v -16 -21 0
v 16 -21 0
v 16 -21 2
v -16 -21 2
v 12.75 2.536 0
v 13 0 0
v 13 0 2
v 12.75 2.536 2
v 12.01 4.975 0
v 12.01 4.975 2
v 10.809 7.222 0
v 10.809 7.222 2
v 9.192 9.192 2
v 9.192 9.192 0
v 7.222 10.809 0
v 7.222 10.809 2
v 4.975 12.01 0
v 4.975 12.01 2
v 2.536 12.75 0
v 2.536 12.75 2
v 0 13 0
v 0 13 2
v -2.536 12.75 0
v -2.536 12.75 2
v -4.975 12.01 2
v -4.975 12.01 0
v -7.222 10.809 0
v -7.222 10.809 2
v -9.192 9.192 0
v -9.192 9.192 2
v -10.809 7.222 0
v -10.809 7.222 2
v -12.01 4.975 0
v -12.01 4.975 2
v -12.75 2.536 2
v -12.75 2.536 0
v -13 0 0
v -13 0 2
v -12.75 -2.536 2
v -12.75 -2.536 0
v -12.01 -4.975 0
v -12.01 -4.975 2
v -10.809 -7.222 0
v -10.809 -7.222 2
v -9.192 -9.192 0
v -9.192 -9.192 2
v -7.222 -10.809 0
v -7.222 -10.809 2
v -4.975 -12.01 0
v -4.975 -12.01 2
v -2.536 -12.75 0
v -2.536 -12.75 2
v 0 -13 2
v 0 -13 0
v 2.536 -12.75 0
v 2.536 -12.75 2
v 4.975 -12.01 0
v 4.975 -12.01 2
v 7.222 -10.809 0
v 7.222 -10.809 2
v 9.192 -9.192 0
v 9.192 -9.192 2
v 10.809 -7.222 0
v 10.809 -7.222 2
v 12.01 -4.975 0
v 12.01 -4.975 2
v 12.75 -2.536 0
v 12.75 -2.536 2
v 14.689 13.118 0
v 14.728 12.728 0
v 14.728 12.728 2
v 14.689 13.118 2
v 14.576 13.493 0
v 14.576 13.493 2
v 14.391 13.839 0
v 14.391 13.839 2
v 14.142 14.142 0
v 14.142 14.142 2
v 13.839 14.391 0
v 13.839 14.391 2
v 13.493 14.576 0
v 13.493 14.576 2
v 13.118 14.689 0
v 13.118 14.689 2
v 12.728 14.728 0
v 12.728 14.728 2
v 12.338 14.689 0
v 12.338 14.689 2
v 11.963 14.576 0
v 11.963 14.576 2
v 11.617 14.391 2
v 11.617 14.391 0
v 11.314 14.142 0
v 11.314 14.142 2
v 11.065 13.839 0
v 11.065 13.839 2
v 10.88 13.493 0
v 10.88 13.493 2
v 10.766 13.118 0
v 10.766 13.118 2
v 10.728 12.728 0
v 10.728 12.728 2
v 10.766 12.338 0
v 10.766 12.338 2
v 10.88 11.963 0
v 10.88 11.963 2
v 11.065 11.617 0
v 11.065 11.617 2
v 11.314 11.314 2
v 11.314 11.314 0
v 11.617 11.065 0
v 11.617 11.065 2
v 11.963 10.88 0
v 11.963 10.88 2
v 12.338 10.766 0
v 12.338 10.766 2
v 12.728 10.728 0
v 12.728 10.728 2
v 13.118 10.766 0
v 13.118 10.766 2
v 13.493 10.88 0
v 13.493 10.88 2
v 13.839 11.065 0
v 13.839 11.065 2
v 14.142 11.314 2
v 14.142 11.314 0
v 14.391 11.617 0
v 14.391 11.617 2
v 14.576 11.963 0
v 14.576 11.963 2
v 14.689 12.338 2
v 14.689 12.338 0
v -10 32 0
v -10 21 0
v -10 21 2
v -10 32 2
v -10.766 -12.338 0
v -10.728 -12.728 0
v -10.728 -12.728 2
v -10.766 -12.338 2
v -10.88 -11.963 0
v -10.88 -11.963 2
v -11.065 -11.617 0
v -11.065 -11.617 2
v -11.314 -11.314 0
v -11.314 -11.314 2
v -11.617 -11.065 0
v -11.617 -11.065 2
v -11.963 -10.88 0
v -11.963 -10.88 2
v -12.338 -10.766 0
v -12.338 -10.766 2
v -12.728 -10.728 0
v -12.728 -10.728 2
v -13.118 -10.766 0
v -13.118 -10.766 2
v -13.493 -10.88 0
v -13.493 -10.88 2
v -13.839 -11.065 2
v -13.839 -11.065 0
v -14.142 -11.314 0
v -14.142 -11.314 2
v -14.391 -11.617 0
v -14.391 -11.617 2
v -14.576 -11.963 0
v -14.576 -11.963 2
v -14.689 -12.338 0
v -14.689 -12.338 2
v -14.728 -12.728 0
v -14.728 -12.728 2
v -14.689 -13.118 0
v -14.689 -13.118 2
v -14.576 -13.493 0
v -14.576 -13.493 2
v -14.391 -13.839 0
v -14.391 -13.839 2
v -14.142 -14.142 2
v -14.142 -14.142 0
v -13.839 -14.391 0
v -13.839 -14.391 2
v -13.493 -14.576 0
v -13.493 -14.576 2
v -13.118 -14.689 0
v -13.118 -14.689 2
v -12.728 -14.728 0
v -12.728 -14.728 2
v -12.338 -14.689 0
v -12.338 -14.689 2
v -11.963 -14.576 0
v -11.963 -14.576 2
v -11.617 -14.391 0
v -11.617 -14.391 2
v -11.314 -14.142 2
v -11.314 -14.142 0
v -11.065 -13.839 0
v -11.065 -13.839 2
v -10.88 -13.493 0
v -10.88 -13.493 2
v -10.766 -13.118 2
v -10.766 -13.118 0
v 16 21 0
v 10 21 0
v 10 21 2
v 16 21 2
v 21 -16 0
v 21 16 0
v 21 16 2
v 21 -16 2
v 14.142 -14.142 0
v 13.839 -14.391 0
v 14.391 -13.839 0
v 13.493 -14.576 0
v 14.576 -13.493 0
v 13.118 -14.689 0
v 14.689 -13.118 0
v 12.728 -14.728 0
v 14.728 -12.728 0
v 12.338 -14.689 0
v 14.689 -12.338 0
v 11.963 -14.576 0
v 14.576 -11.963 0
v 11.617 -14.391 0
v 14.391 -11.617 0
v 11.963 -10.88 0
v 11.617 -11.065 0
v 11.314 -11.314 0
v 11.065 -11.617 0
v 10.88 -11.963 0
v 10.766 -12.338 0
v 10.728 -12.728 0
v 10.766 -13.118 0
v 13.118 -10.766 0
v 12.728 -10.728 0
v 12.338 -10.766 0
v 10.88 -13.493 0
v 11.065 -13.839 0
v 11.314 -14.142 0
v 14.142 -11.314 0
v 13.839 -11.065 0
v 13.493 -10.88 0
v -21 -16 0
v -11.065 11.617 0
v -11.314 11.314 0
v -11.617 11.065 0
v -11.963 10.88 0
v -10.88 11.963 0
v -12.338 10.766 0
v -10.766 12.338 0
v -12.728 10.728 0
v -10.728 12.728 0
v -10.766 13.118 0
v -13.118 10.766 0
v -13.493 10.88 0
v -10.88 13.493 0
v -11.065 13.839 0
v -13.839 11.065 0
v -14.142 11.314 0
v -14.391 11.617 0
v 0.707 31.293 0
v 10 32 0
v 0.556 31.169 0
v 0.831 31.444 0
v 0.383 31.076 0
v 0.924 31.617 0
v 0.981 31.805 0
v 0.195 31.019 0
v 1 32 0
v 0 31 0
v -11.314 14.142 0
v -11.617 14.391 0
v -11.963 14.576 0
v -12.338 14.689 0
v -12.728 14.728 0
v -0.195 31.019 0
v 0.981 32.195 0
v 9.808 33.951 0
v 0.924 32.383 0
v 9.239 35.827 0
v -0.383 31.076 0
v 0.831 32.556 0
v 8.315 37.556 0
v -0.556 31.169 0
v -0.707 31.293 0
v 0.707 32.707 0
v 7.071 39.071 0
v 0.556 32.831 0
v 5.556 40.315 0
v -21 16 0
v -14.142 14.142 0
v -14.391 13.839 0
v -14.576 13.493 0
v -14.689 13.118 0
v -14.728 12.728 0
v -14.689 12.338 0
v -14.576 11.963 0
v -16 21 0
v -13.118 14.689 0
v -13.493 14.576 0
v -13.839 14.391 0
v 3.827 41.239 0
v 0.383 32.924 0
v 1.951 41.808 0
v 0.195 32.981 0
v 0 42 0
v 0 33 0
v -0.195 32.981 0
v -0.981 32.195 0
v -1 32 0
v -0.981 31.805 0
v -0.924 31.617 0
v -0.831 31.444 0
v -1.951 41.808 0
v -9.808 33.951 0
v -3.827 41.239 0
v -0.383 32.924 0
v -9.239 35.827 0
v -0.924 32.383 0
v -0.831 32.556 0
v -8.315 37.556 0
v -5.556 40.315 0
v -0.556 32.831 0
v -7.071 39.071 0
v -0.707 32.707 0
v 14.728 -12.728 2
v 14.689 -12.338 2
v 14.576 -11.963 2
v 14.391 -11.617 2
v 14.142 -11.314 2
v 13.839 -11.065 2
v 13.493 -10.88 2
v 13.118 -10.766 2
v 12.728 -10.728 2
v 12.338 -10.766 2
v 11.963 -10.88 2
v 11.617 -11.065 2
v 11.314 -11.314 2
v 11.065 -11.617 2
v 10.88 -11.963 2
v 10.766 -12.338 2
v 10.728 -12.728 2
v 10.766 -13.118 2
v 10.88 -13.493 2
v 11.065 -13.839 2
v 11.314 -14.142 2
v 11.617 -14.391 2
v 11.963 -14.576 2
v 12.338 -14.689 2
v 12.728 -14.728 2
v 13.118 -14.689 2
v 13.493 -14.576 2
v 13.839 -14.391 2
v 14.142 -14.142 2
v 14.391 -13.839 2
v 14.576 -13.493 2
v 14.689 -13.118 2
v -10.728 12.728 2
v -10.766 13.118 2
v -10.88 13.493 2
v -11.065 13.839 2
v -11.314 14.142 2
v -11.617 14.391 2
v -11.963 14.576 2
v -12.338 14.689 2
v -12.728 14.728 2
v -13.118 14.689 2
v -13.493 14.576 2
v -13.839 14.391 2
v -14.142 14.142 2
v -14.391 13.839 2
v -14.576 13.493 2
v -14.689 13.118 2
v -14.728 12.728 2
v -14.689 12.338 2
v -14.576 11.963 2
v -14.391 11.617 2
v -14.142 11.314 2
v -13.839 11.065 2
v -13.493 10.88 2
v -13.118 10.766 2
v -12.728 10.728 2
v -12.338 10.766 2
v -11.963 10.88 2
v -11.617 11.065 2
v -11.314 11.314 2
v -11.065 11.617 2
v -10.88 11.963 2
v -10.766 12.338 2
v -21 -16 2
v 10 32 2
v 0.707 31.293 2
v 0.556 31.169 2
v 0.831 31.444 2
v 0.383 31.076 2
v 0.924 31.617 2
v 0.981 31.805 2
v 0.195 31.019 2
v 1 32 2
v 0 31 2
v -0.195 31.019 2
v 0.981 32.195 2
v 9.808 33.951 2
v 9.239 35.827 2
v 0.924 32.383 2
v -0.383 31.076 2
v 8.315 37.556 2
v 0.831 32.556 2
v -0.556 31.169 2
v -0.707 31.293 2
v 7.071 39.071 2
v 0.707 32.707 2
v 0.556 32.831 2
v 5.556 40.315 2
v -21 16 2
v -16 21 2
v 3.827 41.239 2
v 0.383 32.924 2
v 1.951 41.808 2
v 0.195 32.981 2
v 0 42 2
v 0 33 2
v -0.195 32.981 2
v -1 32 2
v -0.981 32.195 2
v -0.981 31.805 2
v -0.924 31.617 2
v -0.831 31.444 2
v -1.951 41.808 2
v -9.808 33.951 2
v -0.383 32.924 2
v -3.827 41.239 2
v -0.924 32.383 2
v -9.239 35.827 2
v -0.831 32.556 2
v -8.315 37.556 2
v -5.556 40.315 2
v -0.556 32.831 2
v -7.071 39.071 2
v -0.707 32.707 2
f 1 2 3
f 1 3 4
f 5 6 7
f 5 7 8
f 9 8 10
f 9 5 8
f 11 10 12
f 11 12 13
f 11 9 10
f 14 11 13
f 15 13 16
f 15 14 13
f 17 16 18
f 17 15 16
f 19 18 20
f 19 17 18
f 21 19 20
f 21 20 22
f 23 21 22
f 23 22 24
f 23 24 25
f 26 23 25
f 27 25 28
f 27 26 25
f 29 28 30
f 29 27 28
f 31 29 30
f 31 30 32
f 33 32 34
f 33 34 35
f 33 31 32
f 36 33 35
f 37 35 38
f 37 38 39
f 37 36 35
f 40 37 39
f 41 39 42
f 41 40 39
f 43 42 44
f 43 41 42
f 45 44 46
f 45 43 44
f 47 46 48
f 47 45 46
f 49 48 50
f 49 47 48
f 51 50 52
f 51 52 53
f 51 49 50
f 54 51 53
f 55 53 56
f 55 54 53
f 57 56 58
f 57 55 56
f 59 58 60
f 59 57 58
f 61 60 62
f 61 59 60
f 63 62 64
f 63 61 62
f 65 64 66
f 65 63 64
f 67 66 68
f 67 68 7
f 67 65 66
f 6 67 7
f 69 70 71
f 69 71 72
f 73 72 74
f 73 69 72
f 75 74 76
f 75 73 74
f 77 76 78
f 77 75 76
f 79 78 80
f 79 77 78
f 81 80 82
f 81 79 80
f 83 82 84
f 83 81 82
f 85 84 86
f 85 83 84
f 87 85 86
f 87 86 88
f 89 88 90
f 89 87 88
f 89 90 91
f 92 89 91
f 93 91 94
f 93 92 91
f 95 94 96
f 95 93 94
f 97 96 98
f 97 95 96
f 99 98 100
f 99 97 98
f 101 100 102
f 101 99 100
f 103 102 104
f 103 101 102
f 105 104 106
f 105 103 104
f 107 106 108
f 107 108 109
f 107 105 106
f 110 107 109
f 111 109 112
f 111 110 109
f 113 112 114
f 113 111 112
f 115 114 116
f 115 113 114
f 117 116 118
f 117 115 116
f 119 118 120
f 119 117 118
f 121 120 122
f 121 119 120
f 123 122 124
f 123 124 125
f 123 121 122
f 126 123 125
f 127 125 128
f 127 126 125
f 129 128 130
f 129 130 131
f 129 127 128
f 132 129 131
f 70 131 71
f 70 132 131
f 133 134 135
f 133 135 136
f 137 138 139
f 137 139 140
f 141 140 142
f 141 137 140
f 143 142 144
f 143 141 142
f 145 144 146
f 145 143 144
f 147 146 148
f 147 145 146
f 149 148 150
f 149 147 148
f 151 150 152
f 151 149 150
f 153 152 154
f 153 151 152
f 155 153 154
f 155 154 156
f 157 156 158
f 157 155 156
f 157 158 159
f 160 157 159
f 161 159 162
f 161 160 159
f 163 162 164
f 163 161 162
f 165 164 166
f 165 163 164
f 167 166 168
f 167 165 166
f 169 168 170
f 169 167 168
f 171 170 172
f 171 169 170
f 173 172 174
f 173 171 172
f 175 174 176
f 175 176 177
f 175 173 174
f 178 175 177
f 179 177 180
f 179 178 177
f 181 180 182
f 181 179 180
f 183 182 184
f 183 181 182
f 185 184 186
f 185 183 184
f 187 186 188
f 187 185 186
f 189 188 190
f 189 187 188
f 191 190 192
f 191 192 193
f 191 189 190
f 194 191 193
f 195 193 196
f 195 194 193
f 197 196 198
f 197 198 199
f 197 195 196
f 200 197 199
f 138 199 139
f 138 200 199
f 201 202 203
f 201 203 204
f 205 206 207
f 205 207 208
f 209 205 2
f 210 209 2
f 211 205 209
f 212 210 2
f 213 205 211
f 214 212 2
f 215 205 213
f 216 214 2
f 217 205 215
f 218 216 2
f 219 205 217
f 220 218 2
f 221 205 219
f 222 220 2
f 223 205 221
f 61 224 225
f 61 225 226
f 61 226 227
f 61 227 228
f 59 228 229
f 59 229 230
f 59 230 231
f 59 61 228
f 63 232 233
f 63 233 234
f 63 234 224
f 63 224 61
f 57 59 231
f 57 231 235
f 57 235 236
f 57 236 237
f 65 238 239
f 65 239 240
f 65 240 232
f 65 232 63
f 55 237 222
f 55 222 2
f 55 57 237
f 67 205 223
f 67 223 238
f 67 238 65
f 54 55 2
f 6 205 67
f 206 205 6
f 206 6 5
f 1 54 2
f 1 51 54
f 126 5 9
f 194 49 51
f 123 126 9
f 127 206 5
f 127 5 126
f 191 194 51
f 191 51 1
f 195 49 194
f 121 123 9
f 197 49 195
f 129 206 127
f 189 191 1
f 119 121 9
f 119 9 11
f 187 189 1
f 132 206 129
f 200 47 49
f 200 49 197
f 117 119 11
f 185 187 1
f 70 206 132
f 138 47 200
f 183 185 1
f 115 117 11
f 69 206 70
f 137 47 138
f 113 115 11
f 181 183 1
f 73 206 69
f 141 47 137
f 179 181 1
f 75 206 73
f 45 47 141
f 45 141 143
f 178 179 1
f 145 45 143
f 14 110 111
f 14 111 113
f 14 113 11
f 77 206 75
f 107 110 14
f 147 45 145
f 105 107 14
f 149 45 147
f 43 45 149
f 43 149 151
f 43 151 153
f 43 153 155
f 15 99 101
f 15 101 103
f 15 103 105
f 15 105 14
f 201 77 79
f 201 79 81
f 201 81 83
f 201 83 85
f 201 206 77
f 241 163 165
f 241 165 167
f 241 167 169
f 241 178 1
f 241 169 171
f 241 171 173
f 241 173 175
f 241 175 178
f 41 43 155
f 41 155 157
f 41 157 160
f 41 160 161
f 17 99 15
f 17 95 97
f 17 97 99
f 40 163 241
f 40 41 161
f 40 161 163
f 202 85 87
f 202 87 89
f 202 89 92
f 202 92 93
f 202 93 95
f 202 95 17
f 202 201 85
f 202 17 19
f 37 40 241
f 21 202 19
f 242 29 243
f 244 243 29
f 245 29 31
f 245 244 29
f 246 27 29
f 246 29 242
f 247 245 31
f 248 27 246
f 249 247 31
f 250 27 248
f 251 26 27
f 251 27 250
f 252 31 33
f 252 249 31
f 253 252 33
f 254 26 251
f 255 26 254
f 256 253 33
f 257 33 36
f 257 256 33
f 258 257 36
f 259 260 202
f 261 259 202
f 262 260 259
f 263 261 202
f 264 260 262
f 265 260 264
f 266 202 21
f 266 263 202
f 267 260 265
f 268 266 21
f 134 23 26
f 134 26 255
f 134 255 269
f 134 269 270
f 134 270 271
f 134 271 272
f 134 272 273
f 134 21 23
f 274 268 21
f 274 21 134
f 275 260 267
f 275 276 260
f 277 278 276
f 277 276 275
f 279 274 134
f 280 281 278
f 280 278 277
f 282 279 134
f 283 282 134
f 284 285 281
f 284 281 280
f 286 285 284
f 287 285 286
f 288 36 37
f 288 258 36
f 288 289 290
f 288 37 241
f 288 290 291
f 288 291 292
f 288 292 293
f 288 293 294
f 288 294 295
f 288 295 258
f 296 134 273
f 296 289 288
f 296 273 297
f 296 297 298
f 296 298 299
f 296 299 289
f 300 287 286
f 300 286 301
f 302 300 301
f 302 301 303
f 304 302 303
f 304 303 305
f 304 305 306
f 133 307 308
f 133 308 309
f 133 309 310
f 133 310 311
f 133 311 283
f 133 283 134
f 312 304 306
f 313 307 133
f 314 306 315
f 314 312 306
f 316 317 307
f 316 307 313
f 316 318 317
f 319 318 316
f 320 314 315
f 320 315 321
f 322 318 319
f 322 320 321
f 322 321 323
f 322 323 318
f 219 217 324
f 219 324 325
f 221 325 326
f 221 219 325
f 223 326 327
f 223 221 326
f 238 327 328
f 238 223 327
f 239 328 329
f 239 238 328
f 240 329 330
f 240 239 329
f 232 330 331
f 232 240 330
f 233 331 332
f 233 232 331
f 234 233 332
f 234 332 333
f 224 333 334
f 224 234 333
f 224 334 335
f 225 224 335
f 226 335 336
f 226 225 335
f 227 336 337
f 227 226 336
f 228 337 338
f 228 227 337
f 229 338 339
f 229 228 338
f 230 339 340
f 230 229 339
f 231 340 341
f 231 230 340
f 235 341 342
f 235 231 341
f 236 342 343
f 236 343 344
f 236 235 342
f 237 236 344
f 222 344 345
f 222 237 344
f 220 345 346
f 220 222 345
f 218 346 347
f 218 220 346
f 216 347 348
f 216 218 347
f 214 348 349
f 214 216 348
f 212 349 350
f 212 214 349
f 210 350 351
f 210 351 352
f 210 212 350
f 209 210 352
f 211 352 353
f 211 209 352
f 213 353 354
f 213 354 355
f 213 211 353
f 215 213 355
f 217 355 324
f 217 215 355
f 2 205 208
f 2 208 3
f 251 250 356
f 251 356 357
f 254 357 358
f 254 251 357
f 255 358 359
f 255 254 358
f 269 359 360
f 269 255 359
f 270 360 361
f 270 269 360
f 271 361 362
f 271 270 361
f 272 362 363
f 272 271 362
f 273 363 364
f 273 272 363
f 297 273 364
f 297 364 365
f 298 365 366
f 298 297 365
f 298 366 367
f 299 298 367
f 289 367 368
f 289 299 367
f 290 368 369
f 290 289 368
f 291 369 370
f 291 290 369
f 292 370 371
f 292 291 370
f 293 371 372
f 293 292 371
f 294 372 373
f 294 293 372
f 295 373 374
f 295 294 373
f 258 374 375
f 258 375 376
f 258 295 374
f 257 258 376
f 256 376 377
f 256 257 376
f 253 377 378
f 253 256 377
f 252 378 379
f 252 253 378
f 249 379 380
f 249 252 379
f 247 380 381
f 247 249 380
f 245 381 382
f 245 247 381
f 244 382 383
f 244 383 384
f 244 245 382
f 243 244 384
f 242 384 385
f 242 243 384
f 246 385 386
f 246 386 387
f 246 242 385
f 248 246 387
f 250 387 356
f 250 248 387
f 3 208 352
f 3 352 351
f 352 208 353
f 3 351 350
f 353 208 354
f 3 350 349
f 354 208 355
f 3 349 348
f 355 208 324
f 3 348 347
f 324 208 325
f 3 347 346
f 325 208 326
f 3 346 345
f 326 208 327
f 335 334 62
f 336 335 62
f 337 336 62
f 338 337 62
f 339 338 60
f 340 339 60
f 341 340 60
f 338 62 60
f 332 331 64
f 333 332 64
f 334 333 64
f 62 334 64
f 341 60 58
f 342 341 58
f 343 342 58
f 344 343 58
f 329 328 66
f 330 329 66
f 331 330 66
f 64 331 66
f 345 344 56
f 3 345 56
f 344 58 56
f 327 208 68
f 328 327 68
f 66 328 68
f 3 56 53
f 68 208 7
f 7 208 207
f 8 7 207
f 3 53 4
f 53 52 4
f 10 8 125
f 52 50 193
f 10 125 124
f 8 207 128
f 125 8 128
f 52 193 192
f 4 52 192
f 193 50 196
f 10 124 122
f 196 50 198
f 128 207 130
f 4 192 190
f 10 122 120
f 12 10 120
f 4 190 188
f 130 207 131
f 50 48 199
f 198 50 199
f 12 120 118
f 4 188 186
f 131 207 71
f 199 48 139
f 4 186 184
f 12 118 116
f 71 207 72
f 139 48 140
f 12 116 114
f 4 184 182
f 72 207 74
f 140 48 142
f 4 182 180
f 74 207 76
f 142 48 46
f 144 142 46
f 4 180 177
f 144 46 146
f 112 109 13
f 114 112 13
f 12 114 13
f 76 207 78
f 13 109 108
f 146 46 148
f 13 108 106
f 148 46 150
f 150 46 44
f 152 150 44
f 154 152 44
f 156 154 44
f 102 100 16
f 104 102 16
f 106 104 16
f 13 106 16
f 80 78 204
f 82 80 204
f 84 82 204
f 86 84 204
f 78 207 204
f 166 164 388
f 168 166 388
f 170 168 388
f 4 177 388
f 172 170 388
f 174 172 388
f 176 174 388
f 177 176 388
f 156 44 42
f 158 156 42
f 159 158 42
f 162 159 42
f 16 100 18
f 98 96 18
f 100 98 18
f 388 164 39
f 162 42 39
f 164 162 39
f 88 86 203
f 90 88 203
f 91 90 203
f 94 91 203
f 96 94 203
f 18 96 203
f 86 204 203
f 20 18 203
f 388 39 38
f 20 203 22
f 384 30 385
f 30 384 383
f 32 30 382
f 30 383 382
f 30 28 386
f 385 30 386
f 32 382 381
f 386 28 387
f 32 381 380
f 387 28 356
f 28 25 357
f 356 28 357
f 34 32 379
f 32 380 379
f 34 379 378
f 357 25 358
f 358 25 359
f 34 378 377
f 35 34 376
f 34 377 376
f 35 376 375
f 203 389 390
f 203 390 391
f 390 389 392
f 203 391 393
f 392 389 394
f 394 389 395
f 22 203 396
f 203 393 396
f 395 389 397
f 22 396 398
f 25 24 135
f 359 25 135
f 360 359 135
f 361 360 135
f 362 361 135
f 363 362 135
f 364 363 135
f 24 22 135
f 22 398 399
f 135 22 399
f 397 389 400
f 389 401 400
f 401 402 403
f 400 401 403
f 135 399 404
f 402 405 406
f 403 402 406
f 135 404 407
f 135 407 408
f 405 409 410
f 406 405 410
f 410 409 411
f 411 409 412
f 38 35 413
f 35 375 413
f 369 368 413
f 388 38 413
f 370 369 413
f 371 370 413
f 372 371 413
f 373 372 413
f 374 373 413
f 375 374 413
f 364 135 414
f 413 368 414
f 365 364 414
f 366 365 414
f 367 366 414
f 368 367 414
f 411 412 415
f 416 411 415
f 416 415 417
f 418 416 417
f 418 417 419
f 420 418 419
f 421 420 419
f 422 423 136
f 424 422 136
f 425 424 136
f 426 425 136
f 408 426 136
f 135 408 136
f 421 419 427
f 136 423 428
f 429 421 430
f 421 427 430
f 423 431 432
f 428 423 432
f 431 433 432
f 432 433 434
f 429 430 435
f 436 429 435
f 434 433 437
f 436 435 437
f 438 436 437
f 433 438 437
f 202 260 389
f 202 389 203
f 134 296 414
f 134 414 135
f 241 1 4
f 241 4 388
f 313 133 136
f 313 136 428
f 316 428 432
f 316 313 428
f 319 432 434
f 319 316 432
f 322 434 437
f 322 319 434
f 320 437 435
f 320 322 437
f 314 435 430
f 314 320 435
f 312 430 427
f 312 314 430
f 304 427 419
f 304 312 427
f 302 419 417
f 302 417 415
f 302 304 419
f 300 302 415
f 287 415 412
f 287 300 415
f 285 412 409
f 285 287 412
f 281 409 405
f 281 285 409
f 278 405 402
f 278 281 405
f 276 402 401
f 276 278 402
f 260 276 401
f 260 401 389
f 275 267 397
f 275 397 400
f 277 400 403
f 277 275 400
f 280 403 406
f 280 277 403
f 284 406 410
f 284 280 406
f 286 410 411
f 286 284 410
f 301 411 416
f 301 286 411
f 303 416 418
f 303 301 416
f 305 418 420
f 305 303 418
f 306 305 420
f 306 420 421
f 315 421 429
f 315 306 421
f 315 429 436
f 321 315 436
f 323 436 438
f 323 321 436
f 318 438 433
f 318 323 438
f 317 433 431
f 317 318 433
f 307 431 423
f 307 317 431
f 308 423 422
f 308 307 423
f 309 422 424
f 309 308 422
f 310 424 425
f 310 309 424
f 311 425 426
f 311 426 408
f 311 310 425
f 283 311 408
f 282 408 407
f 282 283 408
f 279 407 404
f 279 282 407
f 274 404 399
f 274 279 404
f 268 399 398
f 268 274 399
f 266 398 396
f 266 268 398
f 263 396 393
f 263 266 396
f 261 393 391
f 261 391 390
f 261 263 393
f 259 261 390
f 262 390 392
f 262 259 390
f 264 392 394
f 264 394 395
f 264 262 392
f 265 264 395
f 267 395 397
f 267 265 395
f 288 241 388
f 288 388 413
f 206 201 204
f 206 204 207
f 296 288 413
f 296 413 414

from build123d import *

# Parameters (mm, degrees)
CROQUIS1_R              = 2
CROQUIS1_R_2            = 13
CROQUIS1_R_3            = 1
SALIENTE_EXTRUIR1_DEPTH = 2


with BuildPart() as part:
    # Croquis1 → Saliente-Extruir1 (new body)
    with BuildSketch(Plane.XY):
        with BuildLine():
            Line((10, 21), (16, 21))
            Line((16, 21), (21, 16))
            Line((21, 16), (21, -16))
            Line((21, -16), (16, -21))
            Line((16, -21), (-16, -21))
            Line((-16, -21), (-21, -16))
            Line((-21, -16), (-21, 16))
            Line((-21, 16), (-16, 21))
            Line((-16, 21), (-10, 21))
            Line((-10, 21), (-10, 32))
            ThreePointArc((-10, 32), (0, 42), (10, 32))
            Line((10, 32), (10, 21))
        make_face()
        with Locations((12.727922061, 12.727922061)):
            Circle(CROQUIS1_R, mode=Mode.SUBTRACT)
        with Locations((12.727922061, -12.727922061)):
            Circle(CROQUIS1_R, mode=Mode.SUBTRACT)
        with Locations((-12.727922061, -12.727922061)):
            Circle(CROQUIS1_R, mode=Mode.SUBTRACT)
        with Locations((-12.727922061, 12.727922061)):
            Circle(CROQUIS1_R, mode=Mode.SUBTRACT)
        Circle(CROQUIS1_R_2, mode=Mode.SUBTRACT)
        with Locations((0, 32)):
            Circle(CROQUIS1_R_3, mode=Mode.SUBTRACT)
    extrude(amount=SALIENTE_EXTRUIR1_DEPTH)


solid = part.part
